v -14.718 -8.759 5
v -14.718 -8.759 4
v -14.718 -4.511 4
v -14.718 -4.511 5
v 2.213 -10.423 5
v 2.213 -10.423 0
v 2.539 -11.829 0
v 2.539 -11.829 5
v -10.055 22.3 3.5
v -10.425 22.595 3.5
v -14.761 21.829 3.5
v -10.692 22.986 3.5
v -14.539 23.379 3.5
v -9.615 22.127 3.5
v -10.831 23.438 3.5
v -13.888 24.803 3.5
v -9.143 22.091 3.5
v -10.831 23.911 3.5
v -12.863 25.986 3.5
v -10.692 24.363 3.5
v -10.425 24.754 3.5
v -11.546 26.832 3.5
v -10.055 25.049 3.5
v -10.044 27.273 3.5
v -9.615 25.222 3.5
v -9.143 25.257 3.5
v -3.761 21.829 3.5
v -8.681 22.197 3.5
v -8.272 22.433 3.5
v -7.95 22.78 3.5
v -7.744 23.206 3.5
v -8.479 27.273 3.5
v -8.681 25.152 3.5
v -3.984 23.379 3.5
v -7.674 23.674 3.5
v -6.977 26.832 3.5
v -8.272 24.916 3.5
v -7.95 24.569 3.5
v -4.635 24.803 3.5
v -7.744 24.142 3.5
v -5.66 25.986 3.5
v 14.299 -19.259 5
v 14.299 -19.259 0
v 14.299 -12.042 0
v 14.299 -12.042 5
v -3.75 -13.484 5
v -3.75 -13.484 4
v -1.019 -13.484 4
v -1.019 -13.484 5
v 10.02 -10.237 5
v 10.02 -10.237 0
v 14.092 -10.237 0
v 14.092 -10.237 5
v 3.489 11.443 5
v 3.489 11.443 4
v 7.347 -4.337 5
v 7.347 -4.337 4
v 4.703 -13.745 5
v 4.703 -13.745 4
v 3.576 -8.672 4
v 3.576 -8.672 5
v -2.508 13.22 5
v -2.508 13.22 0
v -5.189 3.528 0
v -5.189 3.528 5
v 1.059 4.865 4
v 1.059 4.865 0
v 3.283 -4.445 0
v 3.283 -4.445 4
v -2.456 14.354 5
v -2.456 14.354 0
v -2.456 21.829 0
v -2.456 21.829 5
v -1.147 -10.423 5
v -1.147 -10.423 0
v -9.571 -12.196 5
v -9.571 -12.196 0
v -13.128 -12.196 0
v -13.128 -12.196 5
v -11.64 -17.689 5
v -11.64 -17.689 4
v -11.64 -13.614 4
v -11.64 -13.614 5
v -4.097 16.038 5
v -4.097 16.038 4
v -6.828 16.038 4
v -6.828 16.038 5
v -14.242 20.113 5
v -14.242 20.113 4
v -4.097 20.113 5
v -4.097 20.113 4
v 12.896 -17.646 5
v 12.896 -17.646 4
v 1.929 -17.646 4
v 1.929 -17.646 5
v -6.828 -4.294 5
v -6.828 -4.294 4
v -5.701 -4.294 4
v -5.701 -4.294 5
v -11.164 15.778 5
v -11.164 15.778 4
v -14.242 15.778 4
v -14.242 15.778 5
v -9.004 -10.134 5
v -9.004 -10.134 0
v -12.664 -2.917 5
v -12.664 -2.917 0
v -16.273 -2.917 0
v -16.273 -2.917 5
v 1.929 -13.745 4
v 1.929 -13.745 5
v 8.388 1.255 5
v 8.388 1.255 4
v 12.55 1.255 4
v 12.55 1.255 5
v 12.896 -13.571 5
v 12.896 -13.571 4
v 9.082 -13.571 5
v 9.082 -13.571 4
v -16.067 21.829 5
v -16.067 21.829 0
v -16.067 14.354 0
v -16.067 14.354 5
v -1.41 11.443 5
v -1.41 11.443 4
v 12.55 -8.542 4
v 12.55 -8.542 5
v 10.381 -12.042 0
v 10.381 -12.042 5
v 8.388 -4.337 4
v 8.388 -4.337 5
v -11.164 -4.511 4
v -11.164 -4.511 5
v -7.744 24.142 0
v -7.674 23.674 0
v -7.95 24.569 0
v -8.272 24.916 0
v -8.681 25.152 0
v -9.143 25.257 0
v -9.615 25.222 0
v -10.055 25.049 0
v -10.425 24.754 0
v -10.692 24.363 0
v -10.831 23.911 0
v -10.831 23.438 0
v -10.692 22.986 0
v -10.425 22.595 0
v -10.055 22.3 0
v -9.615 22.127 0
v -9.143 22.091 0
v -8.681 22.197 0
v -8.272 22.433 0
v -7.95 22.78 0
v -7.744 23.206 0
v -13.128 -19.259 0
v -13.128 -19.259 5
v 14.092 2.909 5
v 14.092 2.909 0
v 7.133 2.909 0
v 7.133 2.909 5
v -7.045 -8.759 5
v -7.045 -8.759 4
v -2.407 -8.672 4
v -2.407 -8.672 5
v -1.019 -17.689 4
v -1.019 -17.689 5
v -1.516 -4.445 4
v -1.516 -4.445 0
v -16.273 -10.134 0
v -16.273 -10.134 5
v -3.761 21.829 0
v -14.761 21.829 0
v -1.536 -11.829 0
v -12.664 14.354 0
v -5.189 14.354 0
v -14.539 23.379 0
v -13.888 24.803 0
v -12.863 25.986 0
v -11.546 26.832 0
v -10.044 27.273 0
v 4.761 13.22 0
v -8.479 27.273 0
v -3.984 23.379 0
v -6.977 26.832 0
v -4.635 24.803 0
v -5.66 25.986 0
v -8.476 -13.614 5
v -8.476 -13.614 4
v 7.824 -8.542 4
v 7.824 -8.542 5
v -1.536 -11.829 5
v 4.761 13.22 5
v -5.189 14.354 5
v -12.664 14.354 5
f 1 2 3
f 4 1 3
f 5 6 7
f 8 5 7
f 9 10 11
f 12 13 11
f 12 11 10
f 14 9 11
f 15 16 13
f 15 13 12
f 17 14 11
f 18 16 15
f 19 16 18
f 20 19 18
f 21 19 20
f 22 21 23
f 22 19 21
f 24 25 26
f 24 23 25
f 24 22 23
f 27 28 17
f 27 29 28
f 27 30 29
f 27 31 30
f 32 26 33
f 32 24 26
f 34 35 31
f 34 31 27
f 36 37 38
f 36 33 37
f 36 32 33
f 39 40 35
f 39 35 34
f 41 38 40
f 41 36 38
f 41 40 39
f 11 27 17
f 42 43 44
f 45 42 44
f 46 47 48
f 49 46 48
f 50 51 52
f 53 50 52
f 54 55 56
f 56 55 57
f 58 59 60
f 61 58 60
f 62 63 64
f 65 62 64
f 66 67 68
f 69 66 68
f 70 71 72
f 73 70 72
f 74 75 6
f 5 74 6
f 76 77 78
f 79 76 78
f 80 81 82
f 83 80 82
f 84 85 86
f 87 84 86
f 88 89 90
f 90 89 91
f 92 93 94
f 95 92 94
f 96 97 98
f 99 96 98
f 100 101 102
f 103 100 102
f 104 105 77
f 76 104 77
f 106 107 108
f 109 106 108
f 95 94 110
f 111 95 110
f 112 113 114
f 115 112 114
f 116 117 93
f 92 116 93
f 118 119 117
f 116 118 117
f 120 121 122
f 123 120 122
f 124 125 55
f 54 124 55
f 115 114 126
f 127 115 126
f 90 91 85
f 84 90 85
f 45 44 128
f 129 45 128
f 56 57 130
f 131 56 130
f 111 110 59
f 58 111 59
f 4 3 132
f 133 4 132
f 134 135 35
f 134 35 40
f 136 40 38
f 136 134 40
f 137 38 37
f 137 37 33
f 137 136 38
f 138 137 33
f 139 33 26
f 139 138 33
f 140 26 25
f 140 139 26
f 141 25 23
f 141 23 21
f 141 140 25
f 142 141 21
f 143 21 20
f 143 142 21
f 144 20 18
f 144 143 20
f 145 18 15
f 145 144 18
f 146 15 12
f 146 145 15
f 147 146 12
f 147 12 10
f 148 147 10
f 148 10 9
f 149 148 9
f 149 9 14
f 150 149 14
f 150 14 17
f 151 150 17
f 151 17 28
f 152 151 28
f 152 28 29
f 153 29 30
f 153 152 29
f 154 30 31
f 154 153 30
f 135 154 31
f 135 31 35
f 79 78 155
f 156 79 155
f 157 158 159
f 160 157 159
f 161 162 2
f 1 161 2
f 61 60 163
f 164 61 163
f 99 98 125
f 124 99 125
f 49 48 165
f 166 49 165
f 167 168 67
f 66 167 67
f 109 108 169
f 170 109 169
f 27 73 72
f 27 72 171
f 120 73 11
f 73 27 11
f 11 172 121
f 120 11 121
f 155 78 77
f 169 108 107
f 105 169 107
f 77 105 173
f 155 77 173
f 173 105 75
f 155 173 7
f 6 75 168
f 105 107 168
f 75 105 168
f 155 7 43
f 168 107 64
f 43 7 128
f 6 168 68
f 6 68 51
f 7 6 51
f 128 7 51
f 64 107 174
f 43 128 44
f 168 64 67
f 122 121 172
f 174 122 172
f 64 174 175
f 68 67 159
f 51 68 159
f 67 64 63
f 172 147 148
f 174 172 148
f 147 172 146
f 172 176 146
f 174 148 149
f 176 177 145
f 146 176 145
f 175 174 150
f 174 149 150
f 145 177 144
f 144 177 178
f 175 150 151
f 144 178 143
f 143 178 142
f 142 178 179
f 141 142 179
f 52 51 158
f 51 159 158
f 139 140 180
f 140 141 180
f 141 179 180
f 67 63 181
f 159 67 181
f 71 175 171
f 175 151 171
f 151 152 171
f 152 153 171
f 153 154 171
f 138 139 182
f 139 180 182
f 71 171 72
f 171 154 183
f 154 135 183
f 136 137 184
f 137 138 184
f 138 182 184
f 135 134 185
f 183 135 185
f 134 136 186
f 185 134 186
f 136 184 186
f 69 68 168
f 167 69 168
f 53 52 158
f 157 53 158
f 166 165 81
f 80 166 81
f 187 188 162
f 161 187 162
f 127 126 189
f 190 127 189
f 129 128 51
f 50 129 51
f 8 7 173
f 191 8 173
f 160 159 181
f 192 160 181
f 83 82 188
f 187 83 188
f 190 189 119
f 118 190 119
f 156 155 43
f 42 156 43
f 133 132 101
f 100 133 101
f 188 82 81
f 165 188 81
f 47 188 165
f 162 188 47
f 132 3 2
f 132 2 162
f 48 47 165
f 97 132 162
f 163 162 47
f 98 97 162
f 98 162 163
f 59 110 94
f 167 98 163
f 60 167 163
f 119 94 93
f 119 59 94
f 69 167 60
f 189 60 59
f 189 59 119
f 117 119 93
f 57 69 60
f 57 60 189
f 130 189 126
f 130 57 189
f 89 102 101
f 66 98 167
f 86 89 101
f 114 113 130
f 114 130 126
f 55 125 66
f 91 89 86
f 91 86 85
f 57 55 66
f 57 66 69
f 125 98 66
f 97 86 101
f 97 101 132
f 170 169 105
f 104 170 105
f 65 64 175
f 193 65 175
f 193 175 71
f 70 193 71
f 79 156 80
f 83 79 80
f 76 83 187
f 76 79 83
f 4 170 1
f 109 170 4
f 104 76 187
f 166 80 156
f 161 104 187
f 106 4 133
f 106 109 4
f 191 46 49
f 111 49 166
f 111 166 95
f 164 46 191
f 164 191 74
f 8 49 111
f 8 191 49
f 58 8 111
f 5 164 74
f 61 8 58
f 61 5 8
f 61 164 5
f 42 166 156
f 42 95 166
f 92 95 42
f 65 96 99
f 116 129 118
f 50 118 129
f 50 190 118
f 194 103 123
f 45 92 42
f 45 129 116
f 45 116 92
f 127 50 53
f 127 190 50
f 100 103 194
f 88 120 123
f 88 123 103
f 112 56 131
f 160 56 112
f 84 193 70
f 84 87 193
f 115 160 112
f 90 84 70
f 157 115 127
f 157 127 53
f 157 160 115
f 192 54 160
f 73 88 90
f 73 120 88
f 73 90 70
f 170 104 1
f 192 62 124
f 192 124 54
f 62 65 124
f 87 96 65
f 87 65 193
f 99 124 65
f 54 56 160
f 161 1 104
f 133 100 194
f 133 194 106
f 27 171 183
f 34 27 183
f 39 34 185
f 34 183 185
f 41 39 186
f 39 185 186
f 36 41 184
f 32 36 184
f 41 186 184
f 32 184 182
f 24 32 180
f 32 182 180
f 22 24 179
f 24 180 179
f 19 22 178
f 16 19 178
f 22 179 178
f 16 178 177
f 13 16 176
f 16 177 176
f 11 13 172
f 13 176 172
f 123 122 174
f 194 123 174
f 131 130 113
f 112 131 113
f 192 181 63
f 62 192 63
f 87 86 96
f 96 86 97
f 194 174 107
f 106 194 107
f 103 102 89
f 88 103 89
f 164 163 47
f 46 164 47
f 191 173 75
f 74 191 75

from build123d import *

# Parameters (mm, degrees)
F1_DEPTH = 5
F0_R     = 1.5875
F2_DEPTH = 3.5
F3_DEPTH = 4


with BuildPart() as f1:
    # F0 (on Top) → F1 (new body)
    with BuildSketch(Plane.XY):
        Polygon((-14.761455, 21.829162), (-16.066568, 21.829162), (-16.066568, 14.353847), (-12.664012, 14.353847), (-12.664012, -2.916705), (-16.272783, -2.916705), (-16.272783, -10.13425), (-9.003686, -10.13425), (-9.570778, -12.196405), (-13.127998, -12.196405), (-13.127998, -19.259289), (14.298672, -19.259289), (14.298672, -12.041744), (10.380576, -12.041744), (10.019699, -10.237358), (14.092457, -10.237358), (14.092457, 2.908884), (7.132681, 2.908884), (4.761202, 13.219662), (-2.507896, 13.219662), (-5.188699, 3.527531), (-5.188699, 14.353848), (-2.456342, 14.353848), (-2.456342, 21.829162), (-3.761455, 21.829162), align=None)
        Polygon((-1.53564, -11.828732), (-1.14685, -10.423108), (2.212943, -10.423108), (2.539253, -11.828732), align=None, mode=Mode.SUBTRACT)
        Polygon((-14.241549, 15.777845), (-14.241549, 20.112993), (-4.097303, 20.112993), (-4.097303, 16.037954), (-6.828447, 16.037954), (-6.828447, -4.293891), (-5.701307, -4.293891), (-1.409511, 11.442697), (3.489206, 11.442697), (7.347488, -4.337242), (8.387923, -4.337242), (8.387923, 1.255099), (12.549666, 1.255099), (12.549666, -8.542337), (7.824354, -8.542337), (9.081547, -13.571107), (12.896478, -13.571107), (12.896478, -17.646147), (1.928553, -17.646147), (1.928553, -13.744514), (4.703048, -13.744514), (3.575909, -8.672391), (-2.406595, -8.672391), (-3.750491, -13.484405), (-1.019347, -13.484405), (-1.019347, -17.689498), (-11.640461, -17.689498), (-11.640461, -13.61446), (-8.475802, -13.61446), (-7.045203, -8.759094), (-14.718415, -8.759094), (-14.718415, -4.510649), (-11.163594, -4.510649), (-11.163594, 15.777845), align=None, mode=Mode.SUBTRACT)
    extrude(amount=F1_DEPTH)

    # F0 (on Top) → F2 (join)
    with BuildSketch(Plane.XY):
        with BuildLine():
            ThreePointArc((-3.761455, 21.829162), (-9.261455, 27.329162), (-14.761455, 21.829162))
            Line((-14.761455, 21.829162), (-3.761455, 21.829162))
        make_face()
        with Locations((-9.261455, 23.674398)):
            Circle(F0_R, mode=Mode.SUBTRACT)
    extrude(amount=F2_DEPTH)

    # F0 (on Top) → F3 (join)
    with BuildSketch(Plane.XY):
        Polygon((-4.097303, 20.112993), (-14.241549, 20.112993), (-14.241549, 15.777845), (-11.163594, 15.777845), (-11.163594, -4.510649), (-14.718415, -4.510649), (-14.718415, -8.759094), (-7.045203, -8.759094), (-8.475802, -13.61446), (-11.640461, -13.61446), (-11.640461, -17.689498), (-1.019347, -17.689498), (-1.019347, -13.484405), (-3.750491, -13.484405), (-2.406595, -8.672391), (3.575909, -8.672391), (4.703048, -13.744514), (1.928553, -13.744514), (1.928553, -17.646147), (12.896478, -17.646147), (12.896478, -13.571107), (9.081547, -13.571107), (7.824354, -8.542337), (12.549666, -8.542337), (12.549666, 1.255099), (8.387923, 1.255099), (8.387923, -4.337242), (7.347488, -4.337242), (3.489206, 11.442697), (-1.409511, 11.442697), (-5.701307, -4.293891), (-6.828447, -4.293891), (-6.828447, 16.037954), (-4.097303, 16.037954), align=None)
        Polygon((-1.515705, -4.444579), (1.059277, 4.864968), (3.282977, -4.444579), align=None, mode=Mode.SUBTRACT)
    extrude(amount=F3_DEPTH)


solid = f1.part
